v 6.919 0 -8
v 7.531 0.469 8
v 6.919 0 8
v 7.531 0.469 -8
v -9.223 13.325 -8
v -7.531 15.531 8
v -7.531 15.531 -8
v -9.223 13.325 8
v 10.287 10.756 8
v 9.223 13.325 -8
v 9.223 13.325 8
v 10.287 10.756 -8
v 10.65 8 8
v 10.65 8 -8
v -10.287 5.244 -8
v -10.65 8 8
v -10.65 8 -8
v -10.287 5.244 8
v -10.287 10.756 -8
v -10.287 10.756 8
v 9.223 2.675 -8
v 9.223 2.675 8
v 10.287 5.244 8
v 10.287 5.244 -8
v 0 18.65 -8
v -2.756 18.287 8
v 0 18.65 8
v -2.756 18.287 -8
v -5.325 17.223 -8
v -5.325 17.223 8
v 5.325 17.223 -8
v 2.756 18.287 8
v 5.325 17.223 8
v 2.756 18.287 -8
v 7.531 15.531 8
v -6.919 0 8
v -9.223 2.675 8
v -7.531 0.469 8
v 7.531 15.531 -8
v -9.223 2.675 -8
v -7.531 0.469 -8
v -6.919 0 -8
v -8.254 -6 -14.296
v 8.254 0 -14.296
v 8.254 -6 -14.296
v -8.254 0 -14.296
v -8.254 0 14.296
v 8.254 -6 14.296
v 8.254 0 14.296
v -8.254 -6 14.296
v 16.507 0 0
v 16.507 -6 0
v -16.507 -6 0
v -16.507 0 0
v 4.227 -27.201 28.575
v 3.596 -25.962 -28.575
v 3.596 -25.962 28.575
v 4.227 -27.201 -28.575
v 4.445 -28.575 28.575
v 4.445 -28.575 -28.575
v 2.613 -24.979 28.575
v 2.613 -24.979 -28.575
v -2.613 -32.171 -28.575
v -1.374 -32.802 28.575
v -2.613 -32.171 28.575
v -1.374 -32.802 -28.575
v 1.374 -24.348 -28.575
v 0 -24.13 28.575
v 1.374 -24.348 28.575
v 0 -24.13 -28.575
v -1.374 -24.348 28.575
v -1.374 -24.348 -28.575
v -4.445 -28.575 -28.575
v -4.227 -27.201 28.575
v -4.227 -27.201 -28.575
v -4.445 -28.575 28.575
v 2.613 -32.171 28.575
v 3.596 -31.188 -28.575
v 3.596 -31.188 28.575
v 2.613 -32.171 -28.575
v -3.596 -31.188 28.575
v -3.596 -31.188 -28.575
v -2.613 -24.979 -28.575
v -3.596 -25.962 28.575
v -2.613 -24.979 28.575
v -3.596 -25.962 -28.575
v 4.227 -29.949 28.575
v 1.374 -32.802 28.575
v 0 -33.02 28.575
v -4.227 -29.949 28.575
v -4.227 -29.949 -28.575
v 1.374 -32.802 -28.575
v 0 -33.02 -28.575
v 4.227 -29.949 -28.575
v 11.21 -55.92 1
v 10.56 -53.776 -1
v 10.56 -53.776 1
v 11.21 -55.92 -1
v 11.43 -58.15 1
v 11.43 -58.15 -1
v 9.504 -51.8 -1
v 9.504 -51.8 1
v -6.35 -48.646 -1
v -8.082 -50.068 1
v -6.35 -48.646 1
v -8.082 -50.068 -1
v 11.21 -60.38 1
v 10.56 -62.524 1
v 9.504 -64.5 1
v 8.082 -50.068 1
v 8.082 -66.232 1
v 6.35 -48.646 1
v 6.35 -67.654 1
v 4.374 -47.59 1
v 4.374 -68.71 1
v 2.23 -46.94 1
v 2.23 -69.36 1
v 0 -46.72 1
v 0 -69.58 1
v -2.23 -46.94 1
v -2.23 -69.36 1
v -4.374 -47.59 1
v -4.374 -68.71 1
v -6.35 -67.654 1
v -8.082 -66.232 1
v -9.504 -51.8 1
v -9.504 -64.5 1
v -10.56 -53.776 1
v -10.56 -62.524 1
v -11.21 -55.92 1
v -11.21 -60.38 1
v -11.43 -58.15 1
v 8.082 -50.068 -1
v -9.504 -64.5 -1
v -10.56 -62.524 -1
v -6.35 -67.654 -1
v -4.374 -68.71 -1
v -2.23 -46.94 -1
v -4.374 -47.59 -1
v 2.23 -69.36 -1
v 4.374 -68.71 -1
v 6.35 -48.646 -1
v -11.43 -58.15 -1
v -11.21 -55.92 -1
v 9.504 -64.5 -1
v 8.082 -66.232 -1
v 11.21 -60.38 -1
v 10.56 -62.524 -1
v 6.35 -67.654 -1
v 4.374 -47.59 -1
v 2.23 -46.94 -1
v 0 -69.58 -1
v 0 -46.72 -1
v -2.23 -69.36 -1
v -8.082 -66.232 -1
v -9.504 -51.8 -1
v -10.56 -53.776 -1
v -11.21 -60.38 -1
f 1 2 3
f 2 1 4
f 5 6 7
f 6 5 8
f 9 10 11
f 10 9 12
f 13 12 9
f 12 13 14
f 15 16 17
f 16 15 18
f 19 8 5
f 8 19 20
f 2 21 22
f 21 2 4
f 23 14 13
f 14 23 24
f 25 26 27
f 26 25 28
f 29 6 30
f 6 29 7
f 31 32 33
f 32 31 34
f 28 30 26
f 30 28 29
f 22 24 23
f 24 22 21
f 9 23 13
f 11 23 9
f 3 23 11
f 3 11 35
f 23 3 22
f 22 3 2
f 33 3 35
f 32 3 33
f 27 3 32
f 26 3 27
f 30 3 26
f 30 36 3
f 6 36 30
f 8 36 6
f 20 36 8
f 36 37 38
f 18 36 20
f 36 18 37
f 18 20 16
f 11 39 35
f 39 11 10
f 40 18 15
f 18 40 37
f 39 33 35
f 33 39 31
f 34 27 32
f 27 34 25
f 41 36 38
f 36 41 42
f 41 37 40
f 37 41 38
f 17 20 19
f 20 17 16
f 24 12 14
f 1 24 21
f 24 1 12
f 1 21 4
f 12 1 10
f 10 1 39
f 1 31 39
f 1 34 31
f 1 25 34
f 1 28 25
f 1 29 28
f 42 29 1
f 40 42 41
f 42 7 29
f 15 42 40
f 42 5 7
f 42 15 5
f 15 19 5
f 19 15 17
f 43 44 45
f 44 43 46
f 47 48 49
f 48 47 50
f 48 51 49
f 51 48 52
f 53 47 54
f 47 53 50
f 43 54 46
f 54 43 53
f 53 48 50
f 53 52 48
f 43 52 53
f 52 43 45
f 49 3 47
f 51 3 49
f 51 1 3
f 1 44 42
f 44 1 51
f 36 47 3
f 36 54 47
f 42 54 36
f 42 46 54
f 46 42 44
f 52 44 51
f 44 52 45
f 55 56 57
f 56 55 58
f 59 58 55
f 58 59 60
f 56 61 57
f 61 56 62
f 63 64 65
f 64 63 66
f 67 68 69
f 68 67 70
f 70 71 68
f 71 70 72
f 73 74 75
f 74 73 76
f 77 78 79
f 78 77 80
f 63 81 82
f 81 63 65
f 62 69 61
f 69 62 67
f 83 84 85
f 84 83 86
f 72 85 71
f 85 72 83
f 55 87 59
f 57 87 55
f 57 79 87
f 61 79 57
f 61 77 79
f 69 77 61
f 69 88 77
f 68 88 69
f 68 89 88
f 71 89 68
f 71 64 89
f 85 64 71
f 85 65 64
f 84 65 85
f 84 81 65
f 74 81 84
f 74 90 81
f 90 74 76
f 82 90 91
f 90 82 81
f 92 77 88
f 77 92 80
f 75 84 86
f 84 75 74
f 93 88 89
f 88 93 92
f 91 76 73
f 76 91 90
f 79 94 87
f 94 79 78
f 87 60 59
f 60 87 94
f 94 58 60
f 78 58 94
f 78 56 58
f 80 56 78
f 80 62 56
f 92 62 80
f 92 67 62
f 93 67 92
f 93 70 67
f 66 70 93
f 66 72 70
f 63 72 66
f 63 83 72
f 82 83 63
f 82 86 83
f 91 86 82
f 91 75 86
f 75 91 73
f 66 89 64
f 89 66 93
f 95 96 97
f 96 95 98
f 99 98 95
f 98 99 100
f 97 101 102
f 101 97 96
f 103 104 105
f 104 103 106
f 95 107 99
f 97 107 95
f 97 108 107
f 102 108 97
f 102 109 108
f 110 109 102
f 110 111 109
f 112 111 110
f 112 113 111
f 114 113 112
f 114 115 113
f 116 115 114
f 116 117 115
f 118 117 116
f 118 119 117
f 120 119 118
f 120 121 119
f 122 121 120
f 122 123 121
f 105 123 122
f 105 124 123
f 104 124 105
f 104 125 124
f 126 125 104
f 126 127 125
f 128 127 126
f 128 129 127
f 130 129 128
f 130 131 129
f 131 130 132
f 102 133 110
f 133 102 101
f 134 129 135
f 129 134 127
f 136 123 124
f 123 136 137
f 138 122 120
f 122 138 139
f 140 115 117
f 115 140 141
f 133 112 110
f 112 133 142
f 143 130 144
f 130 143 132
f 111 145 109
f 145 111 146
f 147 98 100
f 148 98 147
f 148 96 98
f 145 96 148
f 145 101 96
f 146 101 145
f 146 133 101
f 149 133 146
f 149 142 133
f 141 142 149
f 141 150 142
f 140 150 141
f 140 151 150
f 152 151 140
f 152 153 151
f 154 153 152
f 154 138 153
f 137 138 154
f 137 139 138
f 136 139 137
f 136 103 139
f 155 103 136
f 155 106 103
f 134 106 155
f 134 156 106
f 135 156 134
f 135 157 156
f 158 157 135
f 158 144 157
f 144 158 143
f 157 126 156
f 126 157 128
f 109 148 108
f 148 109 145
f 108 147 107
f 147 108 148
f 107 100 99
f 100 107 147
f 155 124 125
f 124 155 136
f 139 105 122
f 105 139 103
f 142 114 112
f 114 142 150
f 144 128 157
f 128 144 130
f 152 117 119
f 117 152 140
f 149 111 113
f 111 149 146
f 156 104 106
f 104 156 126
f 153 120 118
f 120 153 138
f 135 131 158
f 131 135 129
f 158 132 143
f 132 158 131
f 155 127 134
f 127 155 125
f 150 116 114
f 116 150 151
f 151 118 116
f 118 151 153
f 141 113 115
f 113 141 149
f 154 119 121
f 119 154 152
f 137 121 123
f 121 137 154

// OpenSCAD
// Auto-generated by scripts/author_from_manifest.py (Phase D.3).
// Source: data/phase_d_manifest.json (sku_intent='globe-gl5616-pendent-286f').
// Do not hand-edit — regenerate from the manifest.
//
// @part globe_gl5616_pendent_286f
// @kind sprinkler_head
// @category head.pendant.k56
// @display-name "Globe GL5616 Pendent K5.6 SR 286°F"
// @mfg globe_fire_sprinkler
// @mfg-pn GL5616
// @listing UL FM
// @hazard-classes LH OH1
// @price-usd 11.95
// @install-minutes 8
// @crew journeyman
// @k-factor 5.6
// @orientation pendant
// @response standard
// @temperature 286F
// @param size_in number default=0.5 label="Size" unit="in"
// @port inlet position=[0,0.014,0] direction=[0,1,0] style=NPT_threaded size_in=0.5 role=drop

size_in = 0.5;
k_factor = 5.6;

length_mm   = 57.15;
body_dia_mm = 25.40;
thread_od   = 21.3;
thread_len  = 16;
deflector_d = body_dia_mm * 0.9;

 union() {
    translate([0, thread_len/2, 0])
        cylinder(h = thread_len, d = thread_od, center = true, $fn = 24);
    translate([0, -3, 0])
        rotate([90, 0, 0])
        cylinder(h = 6, d = thread_od * 1.55, $fn = 6, center = true);
    translate([0, -length_mm/2, 0])
        cylinder(h = length_mm, d = body_dia_mm * 0.35, center = true, $fn = 20);
    translate([0, -length_mm - 1, 0])
        cylinder(h = 2, d = deflector_d, center = true, $fn = 32);
}
